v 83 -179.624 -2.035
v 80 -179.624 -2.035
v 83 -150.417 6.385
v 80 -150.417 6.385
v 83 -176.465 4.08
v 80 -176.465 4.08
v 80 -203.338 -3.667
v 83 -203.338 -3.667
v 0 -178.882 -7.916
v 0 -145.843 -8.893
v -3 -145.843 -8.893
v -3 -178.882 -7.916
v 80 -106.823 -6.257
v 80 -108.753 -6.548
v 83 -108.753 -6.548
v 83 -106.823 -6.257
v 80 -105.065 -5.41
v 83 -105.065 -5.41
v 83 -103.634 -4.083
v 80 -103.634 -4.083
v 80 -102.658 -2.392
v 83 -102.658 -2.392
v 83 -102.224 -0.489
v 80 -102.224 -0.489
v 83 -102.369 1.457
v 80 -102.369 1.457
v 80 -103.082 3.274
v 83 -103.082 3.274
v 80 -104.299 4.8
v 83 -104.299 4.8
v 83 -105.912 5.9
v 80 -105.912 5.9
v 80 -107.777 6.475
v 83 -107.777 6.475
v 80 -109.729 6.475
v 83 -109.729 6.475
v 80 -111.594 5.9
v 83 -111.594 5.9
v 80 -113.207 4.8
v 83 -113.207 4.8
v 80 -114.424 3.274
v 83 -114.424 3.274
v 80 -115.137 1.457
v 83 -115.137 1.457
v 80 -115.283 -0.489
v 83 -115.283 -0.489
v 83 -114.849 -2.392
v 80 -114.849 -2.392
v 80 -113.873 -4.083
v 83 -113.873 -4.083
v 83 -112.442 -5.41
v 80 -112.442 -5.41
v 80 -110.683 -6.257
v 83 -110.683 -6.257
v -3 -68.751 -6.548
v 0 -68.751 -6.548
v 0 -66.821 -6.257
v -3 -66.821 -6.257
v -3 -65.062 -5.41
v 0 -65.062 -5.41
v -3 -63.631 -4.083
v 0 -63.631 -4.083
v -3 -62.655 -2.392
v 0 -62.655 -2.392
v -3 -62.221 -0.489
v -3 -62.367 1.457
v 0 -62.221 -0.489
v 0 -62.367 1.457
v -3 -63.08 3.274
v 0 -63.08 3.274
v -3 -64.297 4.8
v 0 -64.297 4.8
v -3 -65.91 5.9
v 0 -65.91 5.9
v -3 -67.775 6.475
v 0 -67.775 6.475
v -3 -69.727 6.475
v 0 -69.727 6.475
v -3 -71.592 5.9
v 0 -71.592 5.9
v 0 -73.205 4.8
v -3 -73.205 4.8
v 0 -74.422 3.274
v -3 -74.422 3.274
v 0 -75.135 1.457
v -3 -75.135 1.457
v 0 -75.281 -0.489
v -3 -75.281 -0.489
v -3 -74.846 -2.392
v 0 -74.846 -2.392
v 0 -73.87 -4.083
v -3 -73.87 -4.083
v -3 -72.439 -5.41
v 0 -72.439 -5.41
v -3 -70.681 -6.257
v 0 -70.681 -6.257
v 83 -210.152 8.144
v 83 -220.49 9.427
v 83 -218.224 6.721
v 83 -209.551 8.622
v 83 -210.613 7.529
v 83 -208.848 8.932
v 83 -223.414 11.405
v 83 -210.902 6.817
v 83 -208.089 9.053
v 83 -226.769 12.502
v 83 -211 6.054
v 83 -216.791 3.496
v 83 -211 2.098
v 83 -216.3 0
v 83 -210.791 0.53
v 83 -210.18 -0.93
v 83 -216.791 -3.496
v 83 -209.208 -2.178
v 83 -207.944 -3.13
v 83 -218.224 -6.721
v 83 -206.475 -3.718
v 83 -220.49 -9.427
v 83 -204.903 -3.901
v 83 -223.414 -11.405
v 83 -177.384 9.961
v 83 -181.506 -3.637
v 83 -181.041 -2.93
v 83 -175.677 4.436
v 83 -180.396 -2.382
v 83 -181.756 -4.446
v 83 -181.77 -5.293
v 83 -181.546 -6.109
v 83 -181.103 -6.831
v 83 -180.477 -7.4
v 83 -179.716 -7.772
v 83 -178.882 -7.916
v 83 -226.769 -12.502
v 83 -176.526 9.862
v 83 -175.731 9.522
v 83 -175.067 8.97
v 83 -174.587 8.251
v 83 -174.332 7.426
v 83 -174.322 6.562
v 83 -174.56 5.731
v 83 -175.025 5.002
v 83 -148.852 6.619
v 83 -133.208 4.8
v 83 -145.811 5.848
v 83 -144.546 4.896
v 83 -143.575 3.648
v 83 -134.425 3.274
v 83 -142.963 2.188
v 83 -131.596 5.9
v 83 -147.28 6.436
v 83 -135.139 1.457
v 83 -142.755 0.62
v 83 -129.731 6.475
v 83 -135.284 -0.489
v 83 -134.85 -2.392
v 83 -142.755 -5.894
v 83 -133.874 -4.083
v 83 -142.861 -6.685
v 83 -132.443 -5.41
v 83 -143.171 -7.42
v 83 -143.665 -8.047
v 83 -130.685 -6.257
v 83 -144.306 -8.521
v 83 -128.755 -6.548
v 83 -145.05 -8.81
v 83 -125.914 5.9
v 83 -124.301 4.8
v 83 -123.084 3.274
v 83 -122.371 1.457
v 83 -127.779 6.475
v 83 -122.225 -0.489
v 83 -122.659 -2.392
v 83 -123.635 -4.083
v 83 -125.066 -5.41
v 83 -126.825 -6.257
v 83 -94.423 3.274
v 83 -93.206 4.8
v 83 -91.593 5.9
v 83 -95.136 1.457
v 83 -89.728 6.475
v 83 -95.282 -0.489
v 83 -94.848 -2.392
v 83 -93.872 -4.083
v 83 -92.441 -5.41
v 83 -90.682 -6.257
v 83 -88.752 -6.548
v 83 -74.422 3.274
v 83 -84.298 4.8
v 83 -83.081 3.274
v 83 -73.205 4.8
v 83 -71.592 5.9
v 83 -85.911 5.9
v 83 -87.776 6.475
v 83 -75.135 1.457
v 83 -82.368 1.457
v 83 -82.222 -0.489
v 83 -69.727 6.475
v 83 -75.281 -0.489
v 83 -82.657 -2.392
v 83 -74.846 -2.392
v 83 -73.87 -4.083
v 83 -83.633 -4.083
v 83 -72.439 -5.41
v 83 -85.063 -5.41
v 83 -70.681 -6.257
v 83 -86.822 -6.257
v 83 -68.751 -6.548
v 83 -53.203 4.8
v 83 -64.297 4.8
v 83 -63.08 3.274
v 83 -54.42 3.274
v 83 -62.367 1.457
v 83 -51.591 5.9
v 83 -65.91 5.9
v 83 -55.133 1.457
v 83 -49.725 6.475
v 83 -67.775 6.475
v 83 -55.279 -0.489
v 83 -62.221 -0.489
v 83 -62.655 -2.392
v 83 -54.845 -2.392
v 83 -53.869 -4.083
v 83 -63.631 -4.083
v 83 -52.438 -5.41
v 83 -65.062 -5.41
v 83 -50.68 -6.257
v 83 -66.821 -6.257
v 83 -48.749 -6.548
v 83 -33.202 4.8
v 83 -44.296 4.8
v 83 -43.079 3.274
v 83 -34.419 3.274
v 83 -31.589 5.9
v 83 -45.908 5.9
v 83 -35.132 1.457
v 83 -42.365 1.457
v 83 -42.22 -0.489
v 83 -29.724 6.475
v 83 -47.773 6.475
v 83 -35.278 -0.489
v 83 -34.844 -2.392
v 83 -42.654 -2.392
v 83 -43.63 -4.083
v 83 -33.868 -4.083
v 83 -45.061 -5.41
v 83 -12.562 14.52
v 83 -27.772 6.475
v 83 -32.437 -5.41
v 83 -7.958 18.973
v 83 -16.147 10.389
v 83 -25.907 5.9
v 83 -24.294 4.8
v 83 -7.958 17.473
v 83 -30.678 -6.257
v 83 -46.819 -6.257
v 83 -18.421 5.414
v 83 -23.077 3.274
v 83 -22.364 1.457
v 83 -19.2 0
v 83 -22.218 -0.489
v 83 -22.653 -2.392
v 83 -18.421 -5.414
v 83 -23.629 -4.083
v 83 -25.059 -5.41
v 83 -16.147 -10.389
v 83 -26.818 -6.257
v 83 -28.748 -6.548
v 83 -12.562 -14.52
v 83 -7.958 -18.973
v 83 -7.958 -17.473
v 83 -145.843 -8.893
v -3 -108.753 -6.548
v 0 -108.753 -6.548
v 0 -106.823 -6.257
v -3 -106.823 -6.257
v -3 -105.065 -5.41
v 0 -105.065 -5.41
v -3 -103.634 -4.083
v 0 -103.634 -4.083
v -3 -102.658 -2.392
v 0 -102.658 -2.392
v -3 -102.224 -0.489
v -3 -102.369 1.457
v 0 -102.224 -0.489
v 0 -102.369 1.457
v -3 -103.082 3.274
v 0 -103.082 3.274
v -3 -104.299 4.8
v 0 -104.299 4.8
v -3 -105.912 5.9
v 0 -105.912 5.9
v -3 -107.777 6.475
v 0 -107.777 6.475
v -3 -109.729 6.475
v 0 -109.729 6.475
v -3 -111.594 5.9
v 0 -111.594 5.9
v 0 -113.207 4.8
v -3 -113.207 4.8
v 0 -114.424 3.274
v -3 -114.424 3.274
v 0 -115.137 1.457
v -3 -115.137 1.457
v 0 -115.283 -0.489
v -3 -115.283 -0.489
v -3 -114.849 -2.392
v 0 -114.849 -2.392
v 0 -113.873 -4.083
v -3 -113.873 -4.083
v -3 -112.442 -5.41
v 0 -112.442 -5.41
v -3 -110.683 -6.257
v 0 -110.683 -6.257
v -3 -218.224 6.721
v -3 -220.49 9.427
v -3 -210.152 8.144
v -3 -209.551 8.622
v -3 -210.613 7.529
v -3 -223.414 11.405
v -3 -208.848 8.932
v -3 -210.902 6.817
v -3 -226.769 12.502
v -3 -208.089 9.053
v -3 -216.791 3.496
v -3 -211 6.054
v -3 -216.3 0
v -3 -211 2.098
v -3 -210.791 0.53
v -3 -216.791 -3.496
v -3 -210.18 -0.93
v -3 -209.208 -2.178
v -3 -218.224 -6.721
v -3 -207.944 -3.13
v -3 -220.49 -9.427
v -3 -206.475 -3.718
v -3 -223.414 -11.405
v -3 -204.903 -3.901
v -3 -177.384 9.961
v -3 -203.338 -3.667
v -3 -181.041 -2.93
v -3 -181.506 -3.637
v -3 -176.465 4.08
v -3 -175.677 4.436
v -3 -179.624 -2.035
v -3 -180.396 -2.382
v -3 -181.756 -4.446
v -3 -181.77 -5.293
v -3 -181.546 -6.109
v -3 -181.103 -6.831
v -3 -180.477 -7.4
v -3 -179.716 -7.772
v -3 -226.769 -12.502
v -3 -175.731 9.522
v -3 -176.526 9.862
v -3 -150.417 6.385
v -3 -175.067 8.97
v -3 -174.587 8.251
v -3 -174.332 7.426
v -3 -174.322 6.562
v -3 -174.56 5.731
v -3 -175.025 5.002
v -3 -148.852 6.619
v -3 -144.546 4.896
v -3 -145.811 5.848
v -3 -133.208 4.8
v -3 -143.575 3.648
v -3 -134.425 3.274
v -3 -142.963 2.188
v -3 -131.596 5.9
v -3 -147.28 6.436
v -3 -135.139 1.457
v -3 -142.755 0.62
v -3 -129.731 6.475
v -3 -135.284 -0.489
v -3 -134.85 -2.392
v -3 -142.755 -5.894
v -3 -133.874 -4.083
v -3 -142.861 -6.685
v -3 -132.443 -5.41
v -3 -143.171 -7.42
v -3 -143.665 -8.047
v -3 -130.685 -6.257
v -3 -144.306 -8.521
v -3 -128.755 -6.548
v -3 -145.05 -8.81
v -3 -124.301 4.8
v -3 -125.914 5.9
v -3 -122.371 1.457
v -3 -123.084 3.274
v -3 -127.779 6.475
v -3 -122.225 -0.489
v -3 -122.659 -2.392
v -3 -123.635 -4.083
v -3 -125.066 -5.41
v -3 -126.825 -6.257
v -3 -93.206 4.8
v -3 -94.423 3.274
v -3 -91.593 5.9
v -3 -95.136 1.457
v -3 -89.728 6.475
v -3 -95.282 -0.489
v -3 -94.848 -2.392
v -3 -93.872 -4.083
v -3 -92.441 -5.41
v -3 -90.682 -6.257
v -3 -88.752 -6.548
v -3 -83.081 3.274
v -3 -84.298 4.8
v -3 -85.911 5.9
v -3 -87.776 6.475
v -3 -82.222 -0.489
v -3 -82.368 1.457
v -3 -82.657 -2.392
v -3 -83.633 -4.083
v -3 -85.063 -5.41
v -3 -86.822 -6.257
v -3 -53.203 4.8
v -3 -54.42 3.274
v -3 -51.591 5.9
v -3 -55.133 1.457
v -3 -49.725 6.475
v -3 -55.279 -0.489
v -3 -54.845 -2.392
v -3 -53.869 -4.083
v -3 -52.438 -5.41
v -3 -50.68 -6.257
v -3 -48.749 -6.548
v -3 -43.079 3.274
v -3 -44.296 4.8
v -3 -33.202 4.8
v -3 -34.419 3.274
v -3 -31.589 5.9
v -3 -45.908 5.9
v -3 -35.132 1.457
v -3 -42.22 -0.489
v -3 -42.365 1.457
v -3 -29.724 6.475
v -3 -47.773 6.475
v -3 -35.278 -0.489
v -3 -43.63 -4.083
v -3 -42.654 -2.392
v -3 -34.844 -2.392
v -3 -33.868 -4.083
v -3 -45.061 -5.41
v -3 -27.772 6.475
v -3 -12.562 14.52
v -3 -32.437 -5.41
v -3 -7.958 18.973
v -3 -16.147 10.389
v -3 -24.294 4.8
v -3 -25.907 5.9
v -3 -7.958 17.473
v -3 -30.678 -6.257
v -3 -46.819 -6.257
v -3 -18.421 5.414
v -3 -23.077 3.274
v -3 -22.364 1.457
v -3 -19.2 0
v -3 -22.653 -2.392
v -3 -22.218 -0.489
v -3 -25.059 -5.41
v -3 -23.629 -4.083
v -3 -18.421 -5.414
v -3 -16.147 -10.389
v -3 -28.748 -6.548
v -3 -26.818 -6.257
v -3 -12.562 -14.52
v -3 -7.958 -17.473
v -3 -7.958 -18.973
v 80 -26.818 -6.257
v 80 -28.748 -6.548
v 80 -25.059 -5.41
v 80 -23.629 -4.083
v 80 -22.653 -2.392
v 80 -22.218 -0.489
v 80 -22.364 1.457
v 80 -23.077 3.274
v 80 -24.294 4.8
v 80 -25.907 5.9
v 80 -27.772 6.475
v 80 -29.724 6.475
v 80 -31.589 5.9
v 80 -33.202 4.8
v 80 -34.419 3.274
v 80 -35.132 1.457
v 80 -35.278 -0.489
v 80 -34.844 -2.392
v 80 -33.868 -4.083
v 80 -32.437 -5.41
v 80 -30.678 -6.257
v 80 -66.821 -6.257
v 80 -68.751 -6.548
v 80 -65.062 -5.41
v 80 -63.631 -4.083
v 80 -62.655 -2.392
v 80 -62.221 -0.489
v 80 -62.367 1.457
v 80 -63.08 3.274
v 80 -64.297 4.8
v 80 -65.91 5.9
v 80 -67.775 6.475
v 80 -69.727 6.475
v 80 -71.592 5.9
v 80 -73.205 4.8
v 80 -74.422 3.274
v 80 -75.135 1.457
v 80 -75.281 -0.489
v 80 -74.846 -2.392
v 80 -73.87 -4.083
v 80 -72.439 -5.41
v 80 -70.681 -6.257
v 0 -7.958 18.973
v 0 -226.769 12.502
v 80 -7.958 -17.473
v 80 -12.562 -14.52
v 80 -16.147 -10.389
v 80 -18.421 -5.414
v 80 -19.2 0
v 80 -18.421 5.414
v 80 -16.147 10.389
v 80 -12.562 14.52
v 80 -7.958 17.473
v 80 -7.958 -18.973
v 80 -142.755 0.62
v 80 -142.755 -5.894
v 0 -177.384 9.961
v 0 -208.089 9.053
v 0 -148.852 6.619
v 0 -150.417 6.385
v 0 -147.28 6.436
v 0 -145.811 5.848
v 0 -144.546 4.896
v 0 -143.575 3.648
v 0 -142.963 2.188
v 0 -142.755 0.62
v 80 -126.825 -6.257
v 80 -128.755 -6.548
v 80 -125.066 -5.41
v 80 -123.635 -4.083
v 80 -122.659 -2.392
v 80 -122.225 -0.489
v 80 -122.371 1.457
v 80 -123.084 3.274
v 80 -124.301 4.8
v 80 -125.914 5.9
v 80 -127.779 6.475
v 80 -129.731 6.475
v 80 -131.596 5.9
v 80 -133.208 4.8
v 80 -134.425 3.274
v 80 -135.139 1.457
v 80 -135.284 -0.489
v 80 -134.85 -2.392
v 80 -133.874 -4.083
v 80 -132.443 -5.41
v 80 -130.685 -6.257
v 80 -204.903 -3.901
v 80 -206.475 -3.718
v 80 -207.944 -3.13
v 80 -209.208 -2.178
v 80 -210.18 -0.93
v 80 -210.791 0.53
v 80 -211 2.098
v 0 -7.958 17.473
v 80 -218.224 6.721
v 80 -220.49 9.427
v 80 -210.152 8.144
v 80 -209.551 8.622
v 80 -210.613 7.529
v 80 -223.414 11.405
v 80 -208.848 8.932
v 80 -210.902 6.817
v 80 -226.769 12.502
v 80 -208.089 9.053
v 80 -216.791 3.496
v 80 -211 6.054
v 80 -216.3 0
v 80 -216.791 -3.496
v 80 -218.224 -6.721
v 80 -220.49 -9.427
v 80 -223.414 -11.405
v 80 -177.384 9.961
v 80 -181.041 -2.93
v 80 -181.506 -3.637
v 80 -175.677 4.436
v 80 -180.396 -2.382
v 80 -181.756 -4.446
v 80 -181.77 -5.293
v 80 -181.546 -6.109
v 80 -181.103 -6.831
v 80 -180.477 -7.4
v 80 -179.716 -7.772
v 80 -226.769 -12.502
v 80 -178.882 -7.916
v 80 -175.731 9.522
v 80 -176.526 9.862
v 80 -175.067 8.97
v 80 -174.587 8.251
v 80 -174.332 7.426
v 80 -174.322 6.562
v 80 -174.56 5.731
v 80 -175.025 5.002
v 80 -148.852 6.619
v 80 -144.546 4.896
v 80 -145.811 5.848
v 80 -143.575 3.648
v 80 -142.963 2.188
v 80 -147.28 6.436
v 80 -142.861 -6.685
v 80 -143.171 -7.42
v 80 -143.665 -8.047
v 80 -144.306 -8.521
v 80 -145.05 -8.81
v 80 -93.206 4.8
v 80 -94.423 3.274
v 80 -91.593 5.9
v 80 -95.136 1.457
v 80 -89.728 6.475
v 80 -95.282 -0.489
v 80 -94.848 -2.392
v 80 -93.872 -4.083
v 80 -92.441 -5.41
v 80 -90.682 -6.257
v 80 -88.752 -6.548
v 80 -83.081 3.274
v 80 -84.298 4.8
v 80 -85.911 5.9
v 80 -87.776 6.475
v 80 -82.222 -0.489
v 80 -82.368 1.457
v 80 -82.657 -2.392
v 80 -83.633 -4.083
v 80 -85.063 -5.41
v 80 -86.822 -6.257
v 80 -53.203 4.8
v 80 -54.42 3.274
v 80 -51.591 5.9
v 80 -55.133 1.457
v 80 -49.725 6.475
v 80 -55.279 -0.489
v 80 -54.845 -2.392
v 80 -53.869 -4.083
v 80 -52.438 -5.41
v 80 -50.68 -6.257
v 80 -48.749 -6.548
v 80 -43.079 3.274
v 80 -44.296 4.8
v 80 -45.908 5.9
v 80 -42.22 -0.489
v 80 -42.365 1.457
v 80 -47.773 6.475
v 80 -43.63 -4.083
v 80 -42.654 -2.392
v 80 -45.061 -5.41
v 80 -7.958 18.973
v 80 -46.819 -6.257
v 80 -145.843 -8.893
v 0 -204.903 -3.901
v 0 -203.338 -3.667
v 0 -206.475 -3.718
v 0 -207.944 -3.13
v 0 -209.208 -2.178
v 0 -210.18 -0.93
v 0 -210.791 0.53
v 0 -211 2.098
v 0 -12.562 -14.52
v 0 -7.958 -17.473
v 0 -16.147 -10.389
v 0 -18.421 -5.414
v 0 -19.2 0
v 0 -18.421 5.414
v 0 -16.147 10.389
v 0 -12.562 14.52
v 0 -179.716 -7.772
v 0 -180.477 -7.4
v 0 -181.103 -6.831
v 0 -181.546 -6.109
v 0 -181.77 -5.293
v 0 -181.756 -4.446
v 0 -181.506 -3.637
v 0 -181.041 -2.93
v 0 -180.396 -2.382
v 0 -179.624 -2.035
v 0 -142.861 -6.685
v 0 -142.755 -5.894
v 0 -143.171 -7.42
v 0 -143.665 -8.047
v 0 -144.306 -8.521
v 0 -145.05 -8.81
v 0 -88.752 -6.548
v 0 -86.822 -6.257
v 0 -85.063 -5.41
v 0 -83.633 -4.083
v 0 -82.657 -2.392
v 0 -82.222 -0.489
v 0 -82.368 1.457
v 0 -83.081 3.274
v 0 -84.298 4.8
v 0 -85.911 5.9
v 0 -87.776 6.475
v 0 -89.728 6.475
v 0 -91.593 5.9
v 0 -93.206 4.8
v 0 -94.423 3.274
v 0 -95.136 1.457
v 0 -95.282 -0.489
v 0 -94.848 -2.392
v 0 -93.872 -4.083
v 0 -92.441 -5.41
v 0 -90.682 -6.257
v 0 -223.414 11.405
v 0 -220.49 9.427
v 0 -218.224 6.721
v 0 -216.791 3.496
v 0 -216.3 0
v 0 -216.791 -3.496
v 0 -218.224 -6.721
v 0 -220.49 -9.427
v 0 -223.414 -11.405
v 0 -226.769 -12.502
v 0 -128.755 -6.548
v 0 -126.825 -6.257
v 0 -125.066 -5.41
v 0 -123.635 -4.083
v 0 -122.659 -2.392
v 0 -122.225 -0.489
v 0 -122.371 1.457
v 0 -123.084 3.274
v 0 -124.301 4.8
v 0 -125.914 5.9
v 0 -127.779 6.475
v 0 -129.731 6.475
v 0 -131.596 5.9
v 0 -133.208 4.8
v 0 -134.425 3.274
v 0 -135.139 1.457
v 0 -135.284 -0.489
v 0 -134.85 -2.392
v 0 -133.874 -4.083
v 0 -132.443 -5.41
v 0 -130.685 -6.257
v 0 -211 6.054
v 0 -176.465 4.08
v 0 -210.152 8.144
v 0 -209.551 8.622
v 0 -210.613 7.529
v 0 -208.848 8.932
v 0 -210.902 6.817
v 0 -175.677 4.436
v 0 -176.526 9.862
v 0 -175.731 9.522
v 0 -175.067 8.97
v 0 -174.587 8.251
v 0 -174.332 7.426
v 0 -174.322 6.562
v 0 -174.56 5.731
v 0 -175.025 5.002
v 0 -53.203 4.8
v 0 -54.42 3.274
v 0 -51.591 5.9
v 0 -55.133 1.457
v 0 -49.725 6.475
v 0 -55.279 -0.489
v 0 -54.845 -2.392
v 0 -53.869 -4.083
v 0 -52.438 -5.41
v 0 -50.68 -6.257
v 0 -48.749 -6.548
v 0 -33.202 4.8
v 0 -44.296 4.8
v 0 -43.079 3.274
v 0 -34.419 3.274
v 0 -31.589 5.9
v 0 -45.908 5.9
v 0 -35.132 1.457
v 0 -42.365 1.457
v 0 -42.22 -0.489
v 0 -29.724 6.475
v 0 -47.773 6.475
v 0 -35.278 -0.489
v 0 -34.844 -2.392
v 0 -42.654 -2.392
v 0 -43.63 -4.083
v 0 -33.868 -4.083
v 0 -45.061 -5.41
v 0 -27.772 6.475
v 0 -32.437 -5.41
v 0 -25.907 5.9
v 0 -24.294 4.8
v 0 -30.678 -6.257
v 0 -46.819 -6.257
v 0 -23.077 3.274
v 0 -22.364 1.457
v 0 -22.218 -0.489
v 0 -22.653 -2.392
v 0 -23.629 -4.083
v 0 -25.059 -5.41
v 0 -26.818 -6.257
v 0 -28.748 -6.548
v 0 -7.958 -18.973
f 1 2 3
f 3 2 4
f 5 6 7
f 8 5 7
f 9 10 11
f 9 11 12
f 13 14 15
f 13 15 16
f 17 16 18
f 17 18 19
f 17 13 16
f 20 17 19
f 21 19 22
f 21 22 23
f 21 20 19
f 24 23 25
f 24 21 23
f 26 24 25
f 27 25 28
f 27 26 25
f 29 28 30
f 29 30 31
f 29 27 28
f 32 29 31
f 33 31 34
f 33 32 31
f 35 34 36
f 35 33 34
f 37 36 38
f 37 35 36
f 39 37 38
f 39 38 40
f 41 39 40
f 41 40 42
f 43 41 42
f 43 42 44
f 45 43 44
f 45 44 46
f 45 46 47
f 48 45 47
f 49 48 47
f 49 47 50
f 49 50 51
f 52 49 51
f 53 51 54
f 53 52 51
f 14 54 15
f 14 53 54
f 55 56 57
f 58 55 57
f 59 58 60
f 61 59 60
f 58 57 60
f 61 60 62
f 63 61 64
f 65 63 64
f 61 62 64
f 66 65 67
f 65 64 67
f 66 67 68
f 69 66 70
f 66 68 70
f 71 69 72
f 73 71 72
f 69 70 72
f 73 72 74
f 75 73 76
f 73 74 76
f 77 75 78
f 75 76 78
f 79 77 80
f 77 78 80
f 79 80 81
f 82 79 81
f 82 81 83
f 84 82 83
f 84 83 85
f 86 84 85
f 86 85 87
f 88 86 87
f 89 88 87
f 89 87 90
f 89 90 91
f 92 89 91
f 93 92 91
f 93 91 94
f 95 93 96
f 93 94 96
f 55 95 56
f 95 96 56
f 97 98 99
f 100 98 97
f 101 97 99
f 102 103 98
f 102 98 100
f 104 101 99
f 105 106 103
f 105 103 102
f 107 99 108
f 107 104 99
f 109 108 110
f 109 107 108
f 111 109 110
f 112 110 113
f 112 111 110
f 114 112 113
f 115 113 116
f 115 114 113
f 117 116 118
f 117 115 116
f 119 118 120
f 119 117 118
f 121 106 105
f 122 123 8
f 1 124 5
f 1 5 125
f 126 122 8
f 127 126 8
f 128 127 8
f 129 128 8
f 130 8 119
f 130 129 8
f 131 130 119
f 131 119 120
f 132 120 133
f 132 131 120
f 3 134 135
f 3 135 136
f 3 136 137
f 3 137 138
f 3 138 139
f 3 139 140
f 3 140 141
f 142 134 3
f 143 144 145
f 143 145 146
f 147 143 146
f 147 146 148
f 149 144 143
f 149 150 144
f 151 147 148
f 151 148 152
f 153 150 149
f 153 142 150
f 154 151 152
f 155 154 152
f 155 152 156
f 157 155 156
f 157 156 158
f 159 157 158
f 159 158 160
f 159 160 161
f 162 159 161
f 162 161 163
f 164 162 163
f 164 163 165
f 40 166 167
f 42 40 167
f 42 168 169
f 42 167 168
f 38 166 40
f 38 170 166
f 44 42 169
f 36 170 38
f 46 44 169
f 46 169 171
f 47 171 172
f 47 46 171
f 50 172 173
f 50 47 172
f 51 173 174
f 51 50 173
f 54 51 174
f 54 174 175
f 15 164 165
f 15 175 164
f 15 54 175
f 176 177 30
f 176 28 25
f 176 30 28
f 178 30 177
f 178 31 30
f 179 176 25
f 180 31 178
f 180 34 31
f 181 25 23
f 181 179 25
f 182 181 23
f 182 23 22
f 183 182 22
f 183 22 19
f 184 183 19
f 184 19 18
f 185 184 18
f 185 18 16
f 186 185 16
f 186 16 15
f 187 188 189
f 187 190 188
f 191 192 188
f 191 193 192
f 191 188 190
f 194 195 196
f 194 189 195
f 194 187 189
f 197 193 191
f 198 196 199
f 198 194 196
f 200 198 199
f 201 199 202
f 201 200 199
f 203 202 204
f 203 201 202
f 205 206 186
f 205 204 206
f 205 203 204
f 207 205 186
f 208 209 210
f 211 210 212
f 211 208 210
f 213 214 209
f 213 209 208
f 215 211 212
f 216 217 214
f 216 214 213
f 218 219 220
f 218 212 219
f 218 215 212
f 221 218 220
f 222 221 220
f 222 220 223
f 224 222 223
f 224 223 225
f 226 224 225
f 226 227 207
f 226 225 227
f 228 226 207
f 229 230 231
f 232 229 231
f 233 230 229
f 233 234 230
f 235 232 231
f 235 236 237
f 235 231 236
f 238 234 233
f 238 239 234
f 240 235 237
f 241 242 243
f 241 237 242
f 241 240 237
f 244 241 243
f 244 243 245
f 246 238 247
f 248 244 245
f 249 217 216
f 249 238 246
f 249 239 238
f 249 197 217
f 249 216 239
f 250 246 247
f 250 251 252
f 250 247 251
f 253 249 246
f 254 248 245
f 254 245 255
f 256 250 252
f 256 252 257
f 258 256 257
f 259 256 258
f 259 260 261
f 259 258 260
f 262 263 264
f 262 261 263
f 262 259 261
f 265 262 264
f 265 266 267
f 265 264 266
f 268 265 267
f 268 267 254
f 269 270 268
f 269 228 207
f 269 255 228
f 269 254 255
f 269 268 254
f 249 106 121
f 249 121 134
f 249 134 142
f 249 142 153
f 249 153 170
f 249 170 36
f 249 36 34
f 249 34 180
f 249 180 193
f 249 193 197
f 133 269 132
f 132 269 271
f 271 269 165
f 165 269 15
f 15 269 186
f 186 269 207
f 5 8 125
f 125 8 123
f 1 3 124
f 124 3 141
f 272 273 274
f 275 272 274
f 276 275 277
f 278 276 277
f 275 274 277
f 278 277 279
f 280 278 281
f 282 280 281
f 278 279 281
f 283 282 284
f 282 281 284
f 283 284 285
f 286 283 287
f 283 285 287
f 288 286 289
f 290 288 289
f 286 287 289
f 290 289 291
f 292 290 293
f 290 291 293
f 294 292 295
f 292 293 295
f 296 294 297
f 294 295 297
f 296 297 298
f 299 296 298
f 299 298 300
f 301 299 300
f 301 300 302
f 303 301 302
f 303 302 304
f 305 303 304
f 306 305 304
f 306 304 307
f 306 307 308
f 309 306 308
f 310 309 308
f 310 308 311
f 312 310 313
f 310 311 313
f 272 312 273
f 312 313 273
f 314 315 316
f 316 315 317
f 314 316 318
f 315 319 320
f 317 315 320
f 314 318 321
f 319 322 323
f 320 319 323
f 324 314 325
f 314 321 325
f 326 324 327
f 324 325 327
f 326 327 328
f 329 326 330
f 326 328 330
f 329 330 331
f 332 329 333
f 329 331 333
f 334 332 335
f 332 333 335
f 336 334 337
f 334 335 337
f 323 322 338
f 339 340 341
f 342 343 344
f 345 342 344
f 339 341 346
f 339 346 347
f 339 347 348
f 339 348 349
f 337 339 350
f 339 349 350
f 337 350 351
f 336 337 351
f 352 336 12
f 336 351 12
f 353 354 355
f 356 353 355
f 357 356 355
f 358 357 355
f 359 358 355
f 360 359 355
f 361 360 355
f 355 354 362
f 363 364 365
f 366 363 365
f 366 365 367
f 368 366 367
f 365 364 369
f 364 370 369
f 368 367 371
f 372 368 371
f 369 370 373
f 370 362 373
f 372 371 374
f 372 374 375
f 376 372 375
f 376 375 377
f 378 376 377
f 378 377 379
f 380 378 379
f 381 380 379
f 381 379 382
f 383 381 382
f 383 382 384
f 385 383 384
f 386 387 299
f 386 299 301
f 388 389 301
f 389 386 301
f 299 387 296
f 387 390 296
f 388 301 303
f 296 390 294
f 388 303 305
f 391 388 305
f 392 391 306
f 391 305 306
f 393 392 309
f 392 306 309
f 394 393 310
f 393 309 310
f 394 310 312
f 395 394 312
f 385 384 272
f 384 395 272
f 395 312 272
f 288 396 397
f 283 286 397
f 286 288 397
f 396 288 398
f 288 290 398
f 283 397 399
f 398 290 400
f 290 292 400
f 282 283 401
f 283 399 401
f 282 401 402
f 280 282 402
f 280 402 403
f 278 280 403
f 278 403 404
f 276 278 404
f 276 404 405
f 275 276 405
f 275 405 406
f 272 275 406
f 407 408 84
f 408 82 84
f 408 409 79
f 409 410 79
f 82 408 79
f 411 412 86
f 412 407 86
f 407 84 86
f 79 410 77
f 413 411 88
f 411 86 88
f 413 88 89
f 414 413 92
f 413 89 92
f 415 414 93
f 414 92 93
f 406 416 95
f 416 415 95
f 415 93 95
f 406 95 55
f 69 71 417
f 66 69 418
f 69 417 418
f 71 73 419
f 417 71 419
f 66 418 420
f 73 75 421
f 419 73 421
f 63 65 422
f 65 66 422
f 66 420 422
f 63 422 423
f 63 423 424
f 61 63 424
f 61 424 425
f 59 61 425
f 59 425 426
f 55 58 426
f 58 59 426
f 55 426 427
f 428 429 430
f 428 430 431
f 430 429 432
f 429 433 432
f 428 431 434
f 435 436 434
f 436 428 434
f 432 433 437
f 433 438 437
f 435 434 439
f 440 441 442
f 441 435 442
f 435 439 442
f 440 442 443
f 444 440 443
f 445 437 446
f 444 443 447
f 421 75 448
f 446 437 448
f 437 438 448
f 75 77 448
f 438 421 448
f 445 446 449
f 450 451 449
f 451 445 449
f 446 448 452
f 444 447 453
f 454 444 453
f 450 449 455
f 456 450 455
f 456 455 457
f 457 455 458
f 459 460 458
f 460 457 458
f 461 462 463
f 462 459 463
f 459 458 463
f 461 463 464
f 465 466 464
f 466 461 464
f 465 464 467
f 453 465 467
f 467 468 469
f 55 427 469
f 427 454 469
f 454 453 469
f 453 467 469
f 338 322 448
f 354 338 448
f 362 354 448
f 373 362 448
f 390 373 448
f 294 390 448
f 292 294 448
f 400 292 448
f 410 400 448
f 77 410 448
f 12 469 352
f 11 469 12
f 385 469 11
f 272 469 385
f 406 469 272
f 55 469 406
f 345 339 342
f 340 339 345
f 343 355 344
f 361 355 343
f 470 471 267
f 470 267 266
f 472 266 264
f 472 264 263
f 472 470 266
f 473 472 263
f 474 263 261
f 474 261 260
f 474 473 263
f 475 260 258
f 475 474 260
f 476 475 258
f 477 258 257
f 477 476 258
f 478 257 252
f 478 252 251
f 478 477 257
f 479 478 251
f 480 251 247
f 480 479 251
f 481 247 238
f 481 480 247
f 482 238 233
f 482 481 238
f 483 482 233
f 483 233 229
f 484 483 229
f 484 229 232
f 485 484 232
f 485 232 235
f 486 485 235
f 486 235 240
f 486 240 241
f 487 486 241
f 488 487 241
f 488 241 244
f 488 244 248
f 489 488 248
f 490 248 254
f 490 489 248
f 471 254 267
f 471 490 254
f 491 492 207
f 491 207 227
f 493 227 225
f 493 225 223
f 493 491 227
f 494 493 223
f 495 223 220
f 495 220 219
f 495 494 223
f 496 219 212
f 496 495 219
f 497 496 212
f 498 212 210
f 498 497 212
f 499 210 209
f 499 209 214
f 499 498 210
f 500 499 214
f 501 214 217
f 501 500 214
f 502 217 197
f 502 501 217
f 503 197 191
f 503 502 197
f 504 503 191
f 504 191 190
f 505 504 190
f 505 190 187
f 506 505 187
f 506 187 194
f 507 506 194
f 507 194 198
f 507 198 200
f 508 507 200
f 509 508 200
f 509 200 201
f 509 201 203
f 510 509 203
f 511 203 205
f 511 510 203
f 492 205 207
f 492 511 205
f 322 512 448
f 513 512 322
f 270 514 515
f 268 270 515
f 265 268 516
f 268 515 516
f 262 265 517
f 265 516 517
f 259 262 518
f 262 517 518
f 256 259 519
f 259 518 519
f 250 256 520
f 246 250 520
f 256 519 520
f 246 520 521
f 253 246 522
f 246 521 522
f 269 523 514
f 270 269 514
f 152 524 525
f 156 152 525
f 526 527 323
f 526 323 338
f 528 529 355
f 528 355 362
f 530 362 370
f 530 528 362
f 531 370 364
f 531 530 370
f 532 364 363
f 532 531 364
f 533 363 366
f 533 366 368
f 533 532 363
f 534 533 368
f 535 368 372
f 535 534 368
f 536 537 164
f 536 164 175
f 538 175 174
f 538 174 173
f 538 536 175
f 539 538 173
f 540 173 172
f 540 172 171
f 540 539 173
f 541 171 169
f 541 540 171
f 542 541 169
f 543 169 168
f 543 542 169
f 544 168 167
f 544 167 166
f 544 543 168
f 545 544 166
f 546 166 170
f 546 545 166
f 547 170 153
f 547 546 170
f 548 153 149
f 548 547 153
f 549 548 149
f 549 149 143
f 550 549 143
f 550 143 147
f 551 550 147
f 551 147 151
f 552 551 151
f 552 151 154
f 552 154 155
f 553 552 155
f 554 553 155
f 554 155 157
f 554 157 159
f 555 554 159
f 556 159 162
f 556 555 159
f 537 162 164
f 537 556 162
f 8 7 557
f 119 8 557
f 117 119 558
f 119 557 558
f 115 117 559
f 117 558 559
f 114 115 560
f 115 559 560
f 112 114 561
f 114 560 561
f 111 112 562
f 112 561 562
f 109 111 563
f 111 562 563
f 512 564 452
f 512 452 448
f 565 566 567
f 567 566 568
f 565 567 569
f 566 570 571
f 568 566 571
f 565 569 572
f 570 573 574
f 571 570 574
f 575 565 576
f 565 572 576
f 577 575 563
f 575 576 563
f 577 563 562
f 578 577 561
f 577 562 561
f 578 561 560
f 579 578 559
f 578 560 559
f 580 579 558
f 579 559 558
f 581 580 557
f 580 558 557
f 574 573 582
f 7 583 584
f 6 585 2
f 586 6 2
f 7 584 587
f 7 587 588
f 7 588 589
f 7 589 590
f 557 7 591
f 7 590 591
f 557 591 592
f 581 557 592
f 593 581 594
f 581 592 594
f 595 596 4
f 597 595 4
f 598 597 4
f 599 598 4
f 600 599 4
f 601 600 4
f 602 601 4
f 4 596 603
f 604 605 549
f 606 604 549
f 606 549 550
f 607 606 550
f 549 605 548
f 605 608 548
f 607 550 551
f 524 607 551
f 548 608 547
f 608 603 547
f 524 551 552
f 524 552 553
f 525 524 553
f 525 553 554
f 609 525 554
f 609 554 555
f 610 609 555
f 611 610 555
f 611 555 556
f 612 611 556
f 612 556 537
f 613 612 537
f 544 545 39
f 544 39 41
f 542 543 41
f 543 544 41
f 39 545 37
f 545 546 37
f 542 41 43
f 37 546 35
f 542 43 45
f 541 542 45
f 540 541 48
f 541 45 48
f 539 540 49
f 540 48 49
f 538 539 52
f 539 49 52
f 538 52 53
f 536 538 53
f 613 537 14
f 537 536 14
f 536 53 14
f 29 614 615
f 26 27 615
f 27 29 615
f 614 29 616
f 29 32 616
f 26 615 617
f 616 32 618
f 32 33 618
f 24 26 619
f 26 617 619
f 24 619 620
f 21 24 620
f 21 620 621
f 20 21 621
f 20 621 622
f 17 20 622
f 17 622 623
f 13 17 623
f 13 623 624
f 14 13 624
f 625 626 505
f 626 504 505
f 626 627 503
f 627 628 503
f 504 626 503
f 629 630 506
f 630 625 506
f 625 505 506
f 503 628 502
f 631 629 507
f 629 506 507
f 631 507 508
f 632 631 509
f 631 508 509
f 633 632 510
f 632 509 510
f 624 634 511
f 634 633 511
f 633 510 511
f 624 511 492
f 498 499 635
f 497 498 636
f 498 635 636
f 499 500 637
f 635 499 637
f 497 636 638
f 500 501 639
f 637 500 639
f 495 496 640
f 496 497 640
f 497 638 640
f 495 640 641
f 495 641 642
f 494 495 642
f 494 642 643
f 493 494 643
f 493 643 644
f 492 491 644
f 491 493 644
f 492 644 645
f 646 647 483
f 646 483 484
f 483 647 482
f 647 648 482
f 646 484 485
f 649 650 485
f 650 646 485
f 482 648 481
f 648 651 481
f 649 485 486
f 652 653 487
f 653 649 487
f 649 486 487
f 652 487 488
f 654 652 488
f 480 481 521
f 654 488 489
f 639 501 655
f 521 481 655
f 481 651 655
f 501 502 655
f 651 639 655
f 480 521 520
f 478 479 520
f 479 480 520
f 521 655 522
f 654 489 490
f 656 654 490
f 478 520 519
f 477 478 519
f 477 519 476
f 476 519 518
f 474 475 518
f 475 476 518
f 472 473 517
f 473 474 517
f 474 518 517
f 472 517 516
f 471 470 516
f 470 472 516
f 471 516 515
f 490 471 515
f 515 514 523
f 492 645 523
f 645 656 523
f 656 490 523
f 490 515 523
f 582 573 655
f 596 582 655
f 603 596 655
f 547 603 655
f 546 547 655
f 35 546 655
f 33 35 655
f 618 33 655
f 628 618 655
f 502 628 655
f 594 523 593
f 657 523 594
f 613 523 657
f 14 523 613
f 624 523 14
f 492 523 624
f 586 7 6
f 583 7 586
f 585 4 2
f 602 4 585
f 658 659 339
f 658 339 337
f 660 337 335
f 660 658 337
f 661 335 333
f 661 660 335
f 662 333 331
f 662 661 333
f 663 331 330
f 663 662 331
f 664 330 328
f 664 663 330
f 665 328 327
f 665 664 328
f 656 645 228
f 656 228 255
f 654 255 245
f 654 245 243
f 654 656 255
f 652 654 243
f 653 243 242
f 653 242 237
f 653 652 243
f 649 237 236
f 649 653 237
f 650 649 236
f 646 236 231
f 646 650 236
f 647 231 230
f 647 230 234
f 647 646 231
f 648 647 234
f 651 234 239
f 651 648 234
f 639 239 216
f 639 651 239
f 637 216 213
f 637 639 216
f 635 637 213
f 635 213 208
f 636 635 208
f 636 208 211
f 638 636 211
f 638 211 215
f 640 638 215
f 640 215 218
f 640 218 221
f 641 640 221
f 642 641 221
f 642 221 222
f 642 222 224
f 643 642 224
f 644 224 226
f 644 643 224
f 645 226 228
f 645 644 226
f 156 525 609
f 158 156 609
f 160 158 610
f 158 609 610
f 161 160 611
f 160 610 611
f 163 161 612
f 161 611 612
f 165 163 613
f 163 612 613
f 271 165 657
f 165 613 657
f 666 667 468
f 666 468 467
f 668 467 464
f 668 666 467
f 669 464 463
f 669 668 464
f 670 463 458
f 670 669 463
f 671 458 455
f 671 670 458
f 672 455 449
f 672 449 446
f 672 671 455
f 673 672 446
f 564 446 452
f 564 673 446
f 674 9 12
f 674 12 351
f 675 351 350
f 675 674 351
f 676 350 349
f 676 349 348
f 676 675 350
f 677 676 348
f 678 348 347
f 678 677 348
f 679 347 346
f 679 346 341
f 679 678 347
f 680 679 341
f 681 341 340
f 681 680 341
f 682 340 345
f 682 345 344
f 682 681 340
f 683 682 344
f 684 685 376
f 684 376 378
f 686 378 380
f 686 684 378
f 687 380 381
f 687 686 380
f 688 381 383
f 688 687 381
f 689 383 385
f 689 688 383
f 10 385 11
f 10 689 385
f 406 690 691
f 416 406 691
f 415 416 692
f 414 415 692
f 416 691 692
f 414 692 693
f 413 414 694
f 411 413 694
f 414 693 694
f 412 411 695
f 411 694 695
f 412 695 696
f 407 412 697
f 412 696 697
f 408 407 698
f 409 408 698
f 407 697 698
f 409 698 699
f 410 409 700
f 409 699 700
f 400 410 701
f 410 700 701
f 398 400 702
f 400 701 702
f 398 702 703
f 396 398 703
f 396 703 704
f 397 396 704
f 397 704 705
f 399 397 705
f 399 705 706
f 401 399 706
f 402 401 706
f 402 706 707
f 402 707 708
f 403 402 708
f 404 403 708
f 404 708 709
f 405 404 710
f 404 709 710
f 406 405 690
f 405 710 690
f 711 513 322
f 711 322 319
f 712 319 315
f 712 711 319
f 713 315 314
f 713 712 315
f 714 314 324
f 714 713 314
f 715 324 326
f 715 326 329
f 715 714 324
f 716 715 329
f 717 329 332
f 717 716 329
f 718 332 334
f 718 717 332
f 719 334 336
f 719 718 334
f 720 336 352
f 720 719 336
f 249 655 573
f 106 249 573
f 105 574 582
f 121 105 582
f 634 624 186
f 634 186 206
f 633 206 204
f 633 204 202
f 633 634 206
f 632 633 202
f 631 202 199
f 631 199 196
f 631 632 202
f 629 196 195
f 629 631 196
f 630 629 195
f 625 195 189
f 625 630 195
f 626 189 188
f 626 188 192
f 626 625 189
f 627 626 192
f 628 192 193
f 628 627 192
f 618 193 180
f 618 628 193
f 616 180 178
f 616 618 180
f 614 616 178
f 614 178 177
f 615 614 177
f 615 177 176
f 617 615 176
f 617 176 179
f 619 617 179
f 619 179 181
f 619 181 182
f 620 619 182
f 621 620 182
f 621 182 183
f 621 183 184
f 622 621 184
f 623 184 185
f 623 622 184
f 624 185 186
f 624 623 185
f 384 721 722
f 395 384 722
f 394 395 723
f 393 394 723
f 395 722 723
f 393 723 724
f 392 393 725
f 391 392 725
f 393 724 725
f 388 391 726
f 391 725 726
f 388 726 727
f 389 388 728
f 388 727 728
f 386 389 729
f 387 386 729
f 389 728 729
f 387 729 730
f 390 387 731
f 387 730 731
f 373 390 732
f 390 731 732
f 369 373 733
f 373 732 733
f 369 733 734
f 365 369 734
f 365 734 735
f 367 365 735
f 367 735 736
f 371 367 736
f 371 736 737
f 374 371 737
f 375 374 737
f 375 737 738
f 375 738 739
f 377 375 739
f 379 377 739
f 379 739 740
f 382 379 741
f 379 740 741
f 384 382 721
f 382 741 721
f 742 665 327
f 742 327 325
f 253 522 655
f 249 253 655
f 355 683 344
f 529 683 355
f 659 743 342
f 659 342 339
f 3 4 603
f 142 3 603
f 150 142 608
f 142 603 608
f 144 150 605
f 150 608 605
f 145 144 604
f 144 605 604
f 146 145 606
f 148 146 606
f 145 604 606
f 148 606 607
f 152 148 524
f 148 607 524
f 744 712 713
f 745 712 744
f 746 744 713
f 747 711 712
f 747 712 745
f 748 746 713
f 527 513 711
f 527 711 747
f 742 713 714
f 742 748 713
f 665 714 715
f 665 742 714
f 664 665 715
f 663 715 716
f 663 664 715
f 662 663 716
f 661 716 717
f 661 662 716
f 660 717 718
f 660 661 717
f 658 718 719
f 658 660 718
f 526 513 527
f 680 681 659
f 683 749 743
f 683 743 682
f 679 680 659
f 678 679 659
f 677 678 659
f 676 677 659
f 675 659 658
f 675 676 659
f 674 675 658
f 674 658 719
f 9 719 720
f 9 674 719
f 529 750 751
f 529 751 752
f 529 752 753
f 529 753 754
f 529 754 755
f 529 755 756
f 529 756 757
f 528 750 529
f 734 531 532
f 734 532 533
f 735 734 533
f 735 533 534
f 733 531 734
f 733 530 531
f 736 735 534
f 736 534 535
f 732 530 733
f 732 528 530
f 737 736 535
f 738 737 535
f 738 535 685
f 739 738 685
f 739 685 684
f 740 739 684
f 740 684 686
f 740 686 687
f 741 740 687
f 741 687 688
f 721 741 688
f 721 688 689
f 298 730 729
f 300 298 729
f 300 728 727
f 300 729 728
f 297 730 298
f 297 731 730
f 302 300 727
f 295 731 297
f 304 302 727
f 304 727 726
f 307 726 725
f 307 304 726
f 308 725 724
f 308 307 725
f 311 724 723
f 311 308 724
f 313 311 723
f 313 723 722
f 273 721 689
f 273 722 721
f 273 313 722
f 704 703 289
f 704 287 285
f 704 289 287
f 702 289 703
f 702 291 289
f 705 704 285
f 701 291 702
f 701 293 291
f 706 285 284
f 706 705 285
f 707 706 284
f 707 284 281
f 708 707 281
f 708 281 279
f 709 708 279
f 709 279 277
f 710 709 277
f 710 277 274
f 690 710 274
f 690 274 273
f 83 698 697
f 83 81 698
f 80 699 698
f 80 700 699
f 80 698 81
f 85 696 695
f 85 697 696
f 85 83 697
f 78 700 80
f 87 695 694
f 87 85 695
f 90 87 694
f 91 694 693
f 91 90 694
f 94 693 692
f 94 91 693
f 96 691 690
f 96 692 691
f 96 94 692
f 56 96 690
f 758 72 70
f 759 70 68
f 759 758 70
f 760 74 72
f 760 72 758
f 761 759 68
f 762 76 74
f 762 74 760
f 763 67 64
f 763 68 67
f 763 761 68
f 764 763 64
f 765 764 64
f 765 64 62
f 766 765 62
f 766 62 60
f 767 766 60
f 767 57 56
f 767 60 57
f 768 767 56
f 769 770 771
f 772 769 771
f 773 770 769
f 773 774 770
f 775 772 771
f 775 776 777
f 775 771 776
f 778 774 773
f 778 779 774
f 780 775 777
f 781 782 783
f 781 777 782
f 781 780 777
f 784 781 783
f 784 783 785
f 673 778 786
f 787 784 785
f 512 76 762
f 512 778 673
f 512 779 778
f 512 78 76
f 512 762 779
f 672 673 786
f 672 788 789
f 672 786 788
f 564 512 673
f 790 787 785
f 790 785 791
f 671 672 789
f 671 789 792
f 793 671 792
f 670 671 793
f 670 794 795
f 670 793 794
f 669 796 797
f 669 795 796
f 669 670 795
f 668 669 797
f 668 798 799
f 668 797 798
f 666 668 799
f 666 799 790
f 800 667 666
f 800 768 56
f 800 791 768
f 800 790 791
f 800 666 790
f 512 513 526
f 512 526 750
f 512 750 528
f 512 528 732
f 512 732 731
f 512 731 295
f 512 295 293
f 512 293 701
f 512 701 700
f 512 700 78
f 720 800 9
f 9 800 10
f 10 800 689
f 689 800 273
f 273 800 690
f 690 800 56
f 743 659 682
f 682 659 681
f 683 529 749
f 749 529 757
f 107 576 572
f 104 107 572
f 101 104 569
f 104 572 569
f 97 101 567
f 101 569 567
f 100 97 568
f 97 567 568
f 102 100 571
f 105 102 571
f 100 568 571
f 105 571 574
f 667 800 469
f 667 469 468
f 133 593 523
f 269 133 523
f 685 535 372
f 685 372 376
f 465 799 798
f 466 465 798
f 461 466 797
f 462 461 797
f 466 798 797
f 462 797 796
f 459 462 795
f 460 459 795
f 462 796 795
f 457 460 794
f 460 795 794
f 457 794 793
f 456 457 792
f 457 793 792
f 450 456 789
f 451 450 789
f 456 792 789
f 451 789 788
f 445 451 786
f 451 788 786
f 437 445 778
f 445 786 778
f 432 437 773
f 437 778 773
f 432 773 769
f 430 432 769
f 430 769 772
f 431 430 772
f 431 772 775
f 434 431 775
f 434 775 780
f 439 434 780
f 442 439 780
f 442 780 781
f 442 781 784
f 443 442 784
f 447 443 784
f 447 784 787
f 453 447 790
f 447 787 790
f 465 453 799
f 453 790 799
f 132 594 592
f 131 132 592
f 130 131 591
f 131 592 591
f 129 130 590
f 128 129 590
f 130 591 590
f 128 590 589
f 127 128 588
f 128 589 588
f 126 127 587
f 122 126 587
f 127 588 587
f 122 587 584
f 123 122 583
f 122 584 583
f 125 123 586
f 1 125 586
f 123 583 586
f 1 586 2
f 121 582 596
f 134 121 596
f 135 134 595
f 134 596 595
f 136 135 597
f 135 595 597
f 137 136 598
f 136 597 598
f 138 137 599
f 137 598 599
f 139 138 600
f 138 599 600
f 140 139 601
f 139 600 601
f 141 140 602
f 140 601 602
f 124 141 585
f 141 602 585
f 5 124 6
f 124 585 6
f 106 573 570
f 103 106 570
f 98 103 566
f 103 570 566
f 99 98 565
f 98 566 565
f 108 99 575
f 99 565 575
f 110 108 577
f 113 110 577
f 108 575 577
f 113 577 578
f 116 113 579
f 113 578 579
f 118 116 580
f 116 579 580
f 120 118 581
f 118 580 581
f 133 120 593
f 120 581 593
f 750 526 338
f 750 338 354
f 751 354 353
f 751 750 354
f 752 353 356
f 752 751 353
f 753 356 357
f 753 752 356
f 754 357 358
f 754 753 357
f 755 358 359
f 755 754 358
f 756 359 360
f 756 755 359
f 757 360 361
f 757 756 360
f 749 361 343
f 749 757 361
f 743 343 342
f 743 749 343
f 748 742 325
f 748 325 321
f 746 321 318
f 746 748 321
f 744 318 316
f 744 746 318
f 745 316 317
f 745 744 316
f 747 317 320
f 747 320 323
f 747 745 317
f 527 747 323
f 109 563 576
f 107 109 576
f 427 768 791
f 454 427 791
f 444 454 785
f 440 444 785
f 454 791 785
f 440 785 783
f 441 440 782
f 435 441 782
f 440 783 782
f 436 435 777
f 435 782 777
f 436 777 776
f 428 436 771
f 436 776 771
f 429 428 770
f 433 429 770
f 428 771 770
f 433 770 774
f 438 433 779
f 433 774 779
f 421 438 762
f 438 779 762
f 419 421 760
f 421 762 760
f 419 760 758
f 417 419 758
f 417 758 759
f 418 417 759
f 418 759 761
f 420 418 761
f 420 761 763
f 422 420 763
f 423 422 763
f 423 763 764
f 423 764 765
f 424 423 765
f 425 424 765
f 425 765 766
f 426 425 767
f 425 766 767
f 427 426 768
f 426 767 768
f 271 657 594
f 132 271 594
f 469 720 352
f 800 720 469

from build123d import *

# Parameters (mm, degrees)
SKETCH1_2_R         = 6.54812
BOSS_EXTRUDE2_DEPTH = 3
BOSS_EXTRUDE1_START = 80
SKETCH1_R           = 6.54812
BOSS_EXTRUDE1_DEPTH = 3


with BuildPart() as part:
    # Sketch1<2> → Boss-Extrude2 (new body)
    with BuildSketch(Plane(origin=(0, 0, 0), x_dir=(0, 0, -1), z_dir=(1, 0, 0))):
        with BuildLine():
            Line((-18.973056002, -7.958160211), (-12.502432925, -226.768594398))
            ThreePointArc((-12.502432925, -226.768594398), (0, -216.3), (12.502432925, -226.768594398))
            Line((12.502432925, -226.768594398), (18.973056002, -7.958160211))
            Line((18.973056002, -7.958160211), (17.473056002, -7.958160211))
            ThreePointArc((17.473056002, -7.958160211), (0, -19.2), (-17.473056002, -7.958160211))
            Line((-17.473056002, -7.958160211), (-18.973056002, -7.958160211))
        make_face()
        with Locations((0, -48.749422679)):
            Circle(SKETCH1_2_R, mode=Mode.SUBTRACT)
        with Locations((0, -28.74812)):
            Circle(SKETCH1_2_R, mode=Mode.SUBTRACT)
        with Locations((0, -68.750725358)):
            Circle(SKETCH1_2_R, mode=Mode.SUBTRACT)
        with Locations((0, -88.752028037)):
            Circle(SKETCH1_2_R, mode=Mode.SUBTRACT)
        with Locations((0, -108.753330716)):
            Circle(SKETCH1_2_R, mode=Mode.SUBTRACT)
        with Locations((0, -128.754633395)):
            Circle(SKETCH1_2_R, mode=Mode.SUBTRACT)
        with BuildLine():
            Line((-4.079756176, -176.464642755), (3.666856963, -203.338094537))
            ThreePointArc((3.666856963, -203.338094537), (2.695952323, -208.607531512), (-2.0983898, -211))
            Line((-2.0983898, -211), (-6.054394391, -211))
            ThreePointArc((-6.054394391, -211), (-8.144127616, -210.152443971), (-9.053083512, -208.088676699))
            Line((-9.053083512, -208.088676699), (-9.961068678, -177.384272185))
            ThreePointArc((-9.961068678, -177.384272185), (-7.425841946, -174.33161124), (-4.079756176, -176.464642755))
        make_face(mode=Mode.SUBTRACT)
        with BuildLine():
            Line((-0.619612161, -142.754633395), (5.894460955, -142.754633395))
            ThreePointArc((5.894460955, -142.754633395), (8.046743318, -143.664831826), (8.892924931, -145.843078193))
            Line((8.892924931, -145.843078193), (7.915908511, -178.881841947))
            ThreePointArc((7.915908511, -178.881841947), (5.292867152, -181.769553791), (2.034596009, -179.624117979))
            Line((2.034596009, -179.624117979), (-6.384858924, -150.416538858))
            ThreePointArc((-6.384858924, -150.416538858), (-5.413954284, -145.147101883), (-0.619612161, -142.754633395))
        make_face(mode=Mode.SUBTRACT)
    extrude(amount=-BOSS_EXTRUDE2_DEPTH)


with BuildPart() as body_2:
    # Sketch1 → Boss-Extrude1 (new body)
    with BuildSketch(Plane(origin=(0, 0, 0), x_dir=(0, 0, -1), z_dir=(1, 0, 0)).offset(BOSS_EXTRUDE1_START)):
        with BuildLine():
            Line((-18.973056002, -7.958160211), (-12.502432925, -226.768594398))
            ThreePointArc((-12.502432925, -226.768594398), (0, -216.3), (12.502432925, -226.768594398))
            Line((12.502432925, -226.768594398), (18.973056002, -7.958160211))
            Line((18.973056002, -7.958160211), (17.473056002, -7.958160211))
            ThreePointArc((17.473056002, -7.958160211), (0, -19.2), (-17.473056002, -7.958160211))
            Line((-17.473056002, -7.958160211), (-18.973056002, -7.958160211))
        make_face()
        with Locations((0, -48.749422679)):
            Circle(SKETCH1_R, mode=Mode.SUBTRACT)
        with Locations((0, -28.74812)):
            Circle(SKETCH1_R, mode=Mode.SUBTRACT)
        with Locations((0, -68.750725358)):
            Circle(SKETCH1_R, mode=Mode.SUBTRACT)
        with Locations((0, -88.752028037)):
            Circle(SKETCH1_R, mode=Mode.SUBTRACT)
        with Locations((0, -108.753330716)):
            Circle(SKETCH1_R, mode=Mode.SUBTRACT)
        with Locations((0, -128.754633395)):
            Circle(SKETCH1_R, mode=Mode.SUBTRACT)
        with BuildLine():
            Line((-4.079756176, -176.464642755), (3.666856963, -203.338094537))
            ThreePointArc((3.666856963, -203.338094537), (2.695952323, -208.607531512), (-2.0983898, -211))
            Line((-2.0983898, -211), (-6.054394391, -211))
            ThreePointArc((-6.054394391, -211), (-8.144127616, -210.152443971), (-9.053083512, -208.088676699))
            Line((-9.053083512, -208.088676699), (-9.961068678, -177.384272185))
            ThreePointArc((-9.961068678, -177.384272185), (-7.425841946, -174.33161124), (-4.079756176, -176.464642755))
        make_face(mode=Mode.SUBTRACT)
        with BuildLine():
            Line((-0.619612161, -142.754633395), (5.894460955, -142.754633395))
            ThreePointArc((5.894460955, -142.754633395), (8.046743318, -143.664831826), (8.892924931, -145.843078193))
            Line((8.892924931, -145.843078193), (7.915908511, -178.881841947))
            ThreePointArc((7.915908511, -178.881841947), (5.292867152, -181.769553791), (2.034596009, -179.624117979))
            Line((2.034596009, -179.624117979), (-6.384858924, -150.416538858))
            ThreePointArc((-6.384858924, -150.416538858), (-5.413954284, -145.147101883), (-0.619612161, -142.754633395))
        make_face(mode=Mode.SUBTRACT)
    extrude(amount=BOSS_EXTRUDE1_DEPTH)


solid = Compound([part.part, body_2.part])
